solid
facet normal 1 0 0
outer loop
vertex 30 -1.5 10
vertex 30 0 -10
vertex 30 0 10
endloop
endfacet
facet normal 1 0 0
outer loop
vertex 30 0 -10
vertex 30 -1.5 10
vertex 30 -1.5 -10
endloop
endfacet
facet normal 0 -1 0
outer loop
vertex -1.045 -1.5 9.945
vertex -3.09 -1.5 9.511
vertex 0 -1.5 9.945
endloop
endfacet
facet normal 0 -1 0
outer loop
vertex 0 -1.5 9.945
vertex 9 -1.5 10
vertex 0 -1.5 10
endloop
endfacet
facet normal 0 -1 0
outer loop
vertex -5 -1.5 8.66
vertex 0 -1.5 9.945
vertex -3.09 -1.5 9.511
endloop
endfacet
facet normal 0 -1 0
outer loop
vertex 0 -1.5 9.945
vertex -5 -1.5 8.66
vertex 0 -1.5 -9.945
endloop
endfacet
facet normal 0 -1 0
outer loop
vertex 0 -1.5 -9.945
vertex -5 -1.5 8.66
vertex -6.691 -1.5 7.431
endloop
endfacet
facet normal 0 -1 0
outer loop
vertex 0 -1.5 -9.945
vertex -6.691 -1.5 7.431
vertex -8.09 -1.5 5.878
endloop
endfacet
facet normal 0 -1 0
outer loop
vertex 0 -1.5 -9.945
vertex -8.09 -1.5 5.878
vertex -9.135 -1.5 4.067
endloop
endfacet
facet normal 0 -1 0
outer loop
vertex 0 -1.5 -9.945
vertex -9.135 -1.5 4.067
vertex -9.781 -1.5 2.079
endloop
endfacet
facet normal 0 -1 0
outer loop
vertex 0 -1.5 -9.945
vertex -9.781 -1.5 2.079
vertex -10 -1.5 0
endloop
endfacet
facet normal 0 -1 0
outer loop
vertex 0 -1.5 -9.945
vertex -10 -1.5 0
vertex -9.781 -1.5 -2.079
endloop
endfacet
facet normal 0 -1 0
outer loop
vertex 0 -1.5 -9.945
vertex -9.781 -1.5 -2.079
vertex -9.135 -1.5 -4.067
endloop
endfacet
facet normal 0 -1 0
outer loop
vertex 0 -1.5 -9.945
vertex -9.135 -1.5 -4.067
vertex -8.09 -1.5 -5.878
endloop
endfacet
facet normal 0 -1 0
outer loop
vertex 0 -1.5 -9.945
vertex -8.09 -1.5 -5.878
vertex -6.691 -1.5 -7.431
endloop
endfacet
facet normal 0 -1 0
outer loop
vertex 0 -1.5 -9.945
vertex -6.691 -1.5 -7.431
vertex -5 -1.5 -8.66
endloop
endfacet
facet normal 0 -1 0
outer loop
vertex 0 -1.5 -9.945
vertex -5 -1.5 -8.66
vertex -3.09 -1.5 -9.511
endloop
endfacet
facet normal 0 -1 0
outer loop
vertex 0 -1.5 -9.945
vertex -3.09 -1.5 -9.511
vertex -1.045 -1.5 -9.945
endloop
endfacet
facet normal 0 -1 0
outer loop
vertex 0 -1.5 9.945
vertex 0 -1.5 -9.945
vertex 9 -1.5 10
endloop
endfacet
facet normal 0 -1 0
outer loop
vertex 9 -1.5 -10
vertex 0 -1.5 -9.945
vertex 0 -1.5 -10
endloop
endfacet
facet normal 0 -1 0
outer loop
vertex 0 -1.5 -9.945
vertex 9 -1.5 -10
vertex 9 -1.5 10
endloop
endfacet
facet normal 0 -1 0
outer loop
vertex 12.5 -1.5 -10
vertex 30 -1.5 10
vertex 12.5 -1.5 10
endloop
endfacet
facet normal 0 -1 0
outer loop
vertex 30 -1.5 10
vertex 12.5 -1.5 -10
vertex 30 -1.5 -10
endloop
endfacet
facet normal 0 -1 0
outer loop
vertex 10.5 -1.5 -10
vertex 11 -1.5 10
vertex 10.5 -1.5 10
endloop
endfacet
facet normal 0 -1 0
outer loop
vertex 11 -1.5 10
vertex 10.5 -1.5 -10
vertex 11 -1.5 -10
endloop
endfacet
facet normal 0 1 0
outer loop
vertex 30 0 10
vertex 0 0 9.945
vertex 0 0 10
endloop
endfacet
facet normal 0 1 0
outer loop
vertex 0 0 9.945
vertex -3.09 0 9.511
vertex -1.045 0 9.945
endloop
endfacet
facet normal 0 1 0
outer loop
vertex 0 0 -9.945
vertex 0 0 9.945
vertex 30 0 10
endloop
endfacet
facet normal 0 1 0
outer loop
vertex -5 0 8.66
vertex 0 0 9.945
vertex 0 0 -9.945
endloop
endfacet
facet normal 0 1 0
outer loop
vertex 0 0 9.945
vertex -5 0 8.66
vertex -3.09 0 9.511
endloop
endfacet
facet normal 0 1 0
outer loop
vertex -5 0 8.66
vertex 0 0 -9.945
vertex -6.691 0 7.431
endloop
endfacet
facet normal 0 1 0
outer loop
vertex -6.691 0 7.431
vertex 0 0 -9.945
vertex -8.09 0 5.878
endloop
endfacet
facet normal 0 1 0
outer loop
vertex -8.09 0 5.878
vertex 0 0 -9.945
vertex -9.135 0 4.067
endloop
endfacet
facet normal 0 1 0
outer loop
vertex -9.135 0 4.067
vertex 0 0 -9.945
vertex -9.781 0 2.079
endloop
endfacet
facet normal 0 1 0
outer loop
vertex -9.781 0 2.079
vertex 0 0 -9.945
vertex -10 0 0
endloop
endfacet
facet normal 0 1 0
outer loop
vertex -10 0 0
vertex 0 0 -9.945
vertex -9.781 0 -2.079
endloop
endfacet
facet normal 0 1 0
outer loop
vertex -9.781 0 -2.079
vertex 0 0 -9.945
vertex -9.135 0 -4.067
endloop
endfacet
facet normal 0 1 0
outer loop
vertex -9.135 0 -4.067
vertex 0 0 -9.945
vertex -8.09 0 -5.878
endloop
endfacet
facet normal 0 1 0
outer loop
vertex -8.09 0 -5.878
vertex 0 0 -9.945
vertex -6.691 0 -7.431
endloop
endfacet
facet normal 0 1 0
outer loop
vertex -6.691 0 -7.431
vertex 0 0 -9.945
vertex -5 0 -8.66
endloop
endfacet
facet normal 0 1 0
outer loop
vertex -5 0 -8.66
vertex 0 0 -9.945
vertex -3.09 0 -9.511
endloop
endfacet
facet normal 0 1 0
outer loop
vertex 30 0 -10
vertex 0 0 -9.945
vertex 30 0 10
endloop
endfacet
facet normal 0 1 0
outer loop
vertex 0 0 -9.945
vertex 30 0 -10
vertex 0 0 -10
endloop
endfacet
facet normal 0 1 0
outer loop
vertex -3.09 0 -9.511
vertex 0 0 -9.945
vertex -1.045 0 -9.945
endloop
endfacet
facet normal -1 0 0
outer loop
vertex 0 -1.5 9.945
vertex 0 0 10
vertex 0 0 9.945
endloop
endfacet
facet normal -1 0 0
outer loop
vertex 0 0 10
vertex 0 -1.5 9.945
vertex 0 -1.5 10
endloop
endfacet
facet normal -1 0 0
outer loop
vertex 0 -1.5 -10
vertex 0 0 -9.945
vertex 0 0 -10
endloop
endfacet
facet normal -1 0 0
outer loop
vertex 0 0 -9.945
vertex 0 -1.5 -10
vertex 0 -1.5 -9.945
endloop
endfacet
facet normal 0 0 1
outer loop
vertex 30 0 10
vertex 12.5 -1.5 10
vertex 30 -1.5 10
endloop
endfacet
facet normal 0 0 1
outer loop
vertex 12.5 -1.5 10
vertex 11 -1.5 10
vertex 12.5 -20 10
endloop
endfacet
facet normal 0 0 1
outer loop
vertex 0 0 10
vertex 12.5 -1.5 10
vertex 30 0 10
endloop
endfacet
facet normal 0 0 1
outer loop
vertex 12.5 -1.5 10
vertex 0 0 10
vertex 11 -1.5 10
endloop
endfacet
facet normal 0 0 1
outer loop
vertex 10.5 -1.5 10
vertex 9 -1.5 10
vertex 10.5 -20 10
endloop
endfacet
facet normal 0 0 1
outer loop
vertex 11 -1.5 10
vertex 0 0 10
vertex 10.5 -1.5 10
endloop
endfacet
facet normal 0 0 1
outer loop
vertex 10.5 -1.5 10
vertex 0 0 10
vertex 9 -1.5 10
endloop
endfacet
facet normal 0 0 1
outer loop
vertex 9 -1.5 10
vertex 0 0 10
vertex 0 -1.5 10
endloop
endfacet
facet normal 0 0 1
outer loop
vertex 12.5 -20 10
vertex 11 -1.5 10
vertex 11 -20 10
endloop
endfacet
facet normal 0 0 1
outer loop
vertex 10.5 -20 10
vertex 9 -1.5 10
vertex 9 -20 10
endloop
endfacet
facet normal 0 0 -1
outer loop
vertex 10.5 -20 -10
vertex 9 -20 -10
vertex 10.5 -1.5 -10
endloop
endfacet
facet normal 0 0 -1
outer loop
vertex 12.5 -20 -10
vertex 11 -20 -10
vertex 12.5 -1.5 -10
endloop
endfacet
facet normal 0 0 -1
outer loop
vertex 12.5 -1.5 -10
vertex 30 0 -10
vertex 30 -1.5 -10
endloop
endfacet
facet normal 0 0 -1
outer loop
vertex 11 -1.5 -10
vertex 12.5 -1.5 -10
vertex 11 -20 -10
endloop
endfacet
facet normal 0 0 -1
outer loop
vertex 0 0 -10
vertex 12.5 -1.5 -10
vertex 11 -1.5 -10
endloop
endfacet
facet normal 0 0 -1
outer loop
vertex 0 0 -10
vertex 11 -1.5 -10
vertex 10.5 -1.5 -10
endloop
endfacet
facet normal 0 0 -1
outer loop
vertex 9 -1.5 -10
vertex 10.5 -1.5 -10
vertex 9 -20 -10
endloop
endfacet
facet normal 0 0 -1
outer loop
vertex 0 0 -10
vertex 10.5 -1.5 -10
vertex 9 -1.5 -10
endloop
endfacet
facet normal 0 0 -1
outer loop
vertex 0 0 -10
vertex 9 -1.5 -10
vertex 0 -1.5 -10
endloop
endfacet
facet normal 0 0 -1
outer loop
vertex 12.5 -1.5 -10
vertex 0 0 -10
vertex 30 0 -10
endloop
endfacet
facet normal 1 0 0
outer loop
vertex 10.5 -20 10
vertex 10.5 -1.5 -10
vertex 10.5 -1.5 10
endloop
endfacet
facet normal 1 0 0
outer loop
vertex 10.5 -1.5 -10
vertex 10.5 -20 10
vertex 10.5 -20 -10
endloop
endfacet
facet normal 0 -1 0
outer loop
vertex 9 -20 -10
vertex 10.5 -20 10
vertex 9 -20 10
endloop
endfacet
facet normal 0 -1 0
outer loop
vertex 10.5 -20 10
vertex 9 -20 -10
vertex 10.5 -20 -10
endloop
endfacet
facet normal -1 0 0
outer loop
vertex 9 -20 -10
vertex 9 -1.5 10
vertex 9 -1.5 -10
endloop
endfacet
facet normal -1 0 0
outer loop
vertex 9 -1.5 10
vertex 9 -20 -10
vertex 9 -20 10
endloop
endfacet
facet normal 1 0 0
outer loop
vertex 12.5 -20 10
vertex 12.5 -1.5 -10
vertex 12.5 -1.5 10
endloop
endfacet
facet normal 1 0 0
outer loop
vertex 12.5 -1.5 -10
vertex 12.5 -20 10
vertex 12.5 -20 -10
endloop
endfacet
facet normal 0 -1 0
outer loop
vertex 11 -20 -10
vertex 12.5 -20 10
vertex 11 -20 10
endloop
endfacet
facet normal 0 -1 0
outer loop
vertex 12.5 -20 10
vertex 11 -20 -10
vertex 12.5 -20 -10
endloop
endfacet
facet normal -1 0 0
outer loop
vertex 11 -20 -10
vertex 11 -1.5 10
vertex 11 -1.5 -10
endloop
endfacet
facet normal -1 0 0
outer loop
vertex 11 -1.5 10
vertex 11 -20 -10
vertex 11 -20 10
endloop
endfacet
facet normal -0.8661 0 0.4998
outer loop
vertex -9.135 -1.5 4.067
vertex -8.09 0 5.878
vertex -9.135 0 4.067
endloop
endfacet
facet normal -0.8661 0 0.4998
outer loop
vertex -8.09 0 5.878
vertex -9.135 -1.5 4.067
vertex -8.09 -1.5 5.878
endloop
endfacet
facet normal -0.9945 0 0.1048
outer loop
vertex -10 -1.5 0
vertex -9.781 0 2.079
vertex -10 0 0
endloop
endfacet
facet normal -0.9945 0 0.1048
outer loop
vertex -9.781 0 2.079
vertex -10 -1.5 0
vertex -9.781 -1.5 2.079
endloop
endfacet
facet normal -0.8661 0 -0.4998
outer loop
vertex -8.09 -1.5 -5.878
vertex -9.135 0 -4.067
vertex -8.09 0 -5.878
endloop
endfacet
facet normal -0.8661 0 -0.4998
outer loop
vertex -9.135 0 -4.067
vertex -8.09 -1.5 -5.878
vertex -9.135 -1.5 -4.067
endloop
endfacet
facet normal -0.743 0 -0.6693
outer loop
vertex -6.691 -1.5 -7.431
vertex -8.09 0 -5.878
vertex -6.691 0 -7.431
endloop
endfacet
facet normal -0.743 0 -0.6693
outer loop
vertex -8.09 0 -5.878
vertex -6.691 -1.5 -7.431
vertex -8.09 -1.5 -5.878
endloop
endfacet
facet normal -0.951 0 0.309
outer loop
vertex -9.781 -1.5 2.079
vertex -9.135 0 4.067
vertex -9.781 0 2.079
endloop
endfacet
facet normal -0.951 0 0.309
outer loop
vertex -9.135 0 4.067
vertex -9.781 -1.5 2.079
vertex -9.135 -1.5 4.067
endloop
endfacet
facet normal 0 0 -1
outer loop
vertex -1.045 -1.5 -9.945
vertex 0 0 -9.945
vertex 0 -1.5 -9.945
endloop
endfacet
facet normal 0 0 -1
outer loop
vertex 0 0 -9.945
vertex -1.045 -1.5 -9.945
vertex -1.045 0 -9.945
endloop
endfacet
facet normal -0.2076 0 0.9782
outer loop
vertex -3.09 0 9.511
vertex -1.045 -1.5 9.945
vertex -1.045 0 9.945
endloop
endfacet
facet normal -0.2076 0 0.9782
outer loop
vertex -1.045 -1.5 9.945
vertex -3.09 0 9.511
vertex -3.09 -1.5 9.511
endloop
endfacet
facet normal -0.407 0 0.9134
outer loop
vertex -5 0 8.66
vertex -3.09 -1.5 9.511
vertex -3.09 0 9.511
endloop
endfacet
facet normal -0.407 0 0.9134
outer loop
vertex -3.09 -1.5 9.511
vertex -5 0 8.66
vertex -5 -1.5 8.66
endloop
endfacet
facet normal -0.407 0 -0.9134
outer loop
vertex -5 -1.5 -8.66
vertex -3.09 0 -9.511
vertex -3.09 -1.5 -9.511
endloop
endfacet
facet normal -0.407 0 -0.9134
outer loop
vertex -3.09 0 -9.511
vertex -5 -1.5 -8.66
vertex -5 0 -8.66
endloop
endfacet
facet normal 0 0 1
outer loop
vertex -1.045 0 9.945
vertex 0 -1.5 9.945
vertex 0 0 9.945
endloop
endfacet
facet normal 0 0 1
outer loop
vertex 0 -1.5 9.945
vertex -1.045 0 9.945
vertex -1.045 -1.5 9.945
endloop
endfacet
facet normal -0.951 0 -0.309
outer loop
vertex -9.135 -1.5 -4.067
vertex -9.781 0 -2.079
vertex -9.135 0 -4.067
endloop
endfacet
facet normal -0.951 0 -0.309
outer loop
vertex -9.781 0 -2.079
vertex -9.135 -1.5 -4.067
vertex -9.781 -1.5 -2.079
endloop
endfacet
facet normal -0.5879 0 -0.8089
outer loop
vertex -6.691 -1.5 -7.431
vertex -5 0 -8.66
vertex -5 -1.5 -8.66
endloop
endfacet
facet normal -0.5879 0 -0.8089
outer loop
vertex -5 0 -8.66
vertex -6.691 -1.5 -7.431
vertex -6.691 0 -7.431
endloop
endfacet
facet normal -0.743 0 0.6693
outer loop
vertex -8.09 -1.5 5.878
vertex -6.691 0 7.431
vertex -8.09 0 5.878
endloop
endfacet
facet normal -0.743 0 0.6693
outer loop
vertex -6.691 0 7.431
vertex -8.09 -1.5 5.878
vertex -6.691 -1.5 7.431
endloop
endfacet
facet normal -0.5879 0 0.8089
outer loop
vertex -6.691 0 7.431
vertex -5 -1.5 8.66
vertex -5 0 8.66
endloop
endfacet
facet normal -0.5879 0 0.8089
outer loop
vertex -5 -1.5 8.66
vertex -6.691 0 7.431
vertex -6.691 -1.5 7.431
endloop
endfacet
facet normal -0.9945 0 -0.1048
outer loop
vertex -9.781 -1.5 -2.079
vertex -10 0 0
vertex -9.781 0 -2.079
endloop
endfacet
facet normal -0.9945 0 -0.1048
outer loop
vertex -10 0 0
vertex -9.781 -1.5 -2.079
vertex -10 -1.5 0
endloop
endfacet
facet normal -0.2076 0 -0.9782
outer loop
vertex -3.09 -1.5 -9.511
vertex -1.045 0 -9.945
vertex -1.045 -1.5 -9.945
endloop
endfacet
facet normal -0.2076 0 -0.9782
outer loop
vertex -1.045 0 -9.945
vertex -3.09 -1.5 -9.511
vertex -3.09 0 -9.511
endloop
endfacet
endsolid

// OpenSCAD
//Set shoe width in mm
width=20;
length=width*1.5;

//Set shoe wall width in mm
wall=1.5;
holderheight=width;

//Set shoe holder in percent of the shoe length
holderplace=.3;

//Set gap for the holder so the paper is held tight in mm
holdergap=.5;


rotate([90,0,0])
union()
{
    cylinder(r=width/2,h=wall);
    translate([0,-width/2,0])
    {
        cube([length,width,wall]);

        //holders
        translate([length*holderplace,0,0])
            cube([wall,width,holderheight]);
        translate([length*holderplace+wall+holdergap,0,0])
            cube([wall,width,holderheight]);
    }
}
